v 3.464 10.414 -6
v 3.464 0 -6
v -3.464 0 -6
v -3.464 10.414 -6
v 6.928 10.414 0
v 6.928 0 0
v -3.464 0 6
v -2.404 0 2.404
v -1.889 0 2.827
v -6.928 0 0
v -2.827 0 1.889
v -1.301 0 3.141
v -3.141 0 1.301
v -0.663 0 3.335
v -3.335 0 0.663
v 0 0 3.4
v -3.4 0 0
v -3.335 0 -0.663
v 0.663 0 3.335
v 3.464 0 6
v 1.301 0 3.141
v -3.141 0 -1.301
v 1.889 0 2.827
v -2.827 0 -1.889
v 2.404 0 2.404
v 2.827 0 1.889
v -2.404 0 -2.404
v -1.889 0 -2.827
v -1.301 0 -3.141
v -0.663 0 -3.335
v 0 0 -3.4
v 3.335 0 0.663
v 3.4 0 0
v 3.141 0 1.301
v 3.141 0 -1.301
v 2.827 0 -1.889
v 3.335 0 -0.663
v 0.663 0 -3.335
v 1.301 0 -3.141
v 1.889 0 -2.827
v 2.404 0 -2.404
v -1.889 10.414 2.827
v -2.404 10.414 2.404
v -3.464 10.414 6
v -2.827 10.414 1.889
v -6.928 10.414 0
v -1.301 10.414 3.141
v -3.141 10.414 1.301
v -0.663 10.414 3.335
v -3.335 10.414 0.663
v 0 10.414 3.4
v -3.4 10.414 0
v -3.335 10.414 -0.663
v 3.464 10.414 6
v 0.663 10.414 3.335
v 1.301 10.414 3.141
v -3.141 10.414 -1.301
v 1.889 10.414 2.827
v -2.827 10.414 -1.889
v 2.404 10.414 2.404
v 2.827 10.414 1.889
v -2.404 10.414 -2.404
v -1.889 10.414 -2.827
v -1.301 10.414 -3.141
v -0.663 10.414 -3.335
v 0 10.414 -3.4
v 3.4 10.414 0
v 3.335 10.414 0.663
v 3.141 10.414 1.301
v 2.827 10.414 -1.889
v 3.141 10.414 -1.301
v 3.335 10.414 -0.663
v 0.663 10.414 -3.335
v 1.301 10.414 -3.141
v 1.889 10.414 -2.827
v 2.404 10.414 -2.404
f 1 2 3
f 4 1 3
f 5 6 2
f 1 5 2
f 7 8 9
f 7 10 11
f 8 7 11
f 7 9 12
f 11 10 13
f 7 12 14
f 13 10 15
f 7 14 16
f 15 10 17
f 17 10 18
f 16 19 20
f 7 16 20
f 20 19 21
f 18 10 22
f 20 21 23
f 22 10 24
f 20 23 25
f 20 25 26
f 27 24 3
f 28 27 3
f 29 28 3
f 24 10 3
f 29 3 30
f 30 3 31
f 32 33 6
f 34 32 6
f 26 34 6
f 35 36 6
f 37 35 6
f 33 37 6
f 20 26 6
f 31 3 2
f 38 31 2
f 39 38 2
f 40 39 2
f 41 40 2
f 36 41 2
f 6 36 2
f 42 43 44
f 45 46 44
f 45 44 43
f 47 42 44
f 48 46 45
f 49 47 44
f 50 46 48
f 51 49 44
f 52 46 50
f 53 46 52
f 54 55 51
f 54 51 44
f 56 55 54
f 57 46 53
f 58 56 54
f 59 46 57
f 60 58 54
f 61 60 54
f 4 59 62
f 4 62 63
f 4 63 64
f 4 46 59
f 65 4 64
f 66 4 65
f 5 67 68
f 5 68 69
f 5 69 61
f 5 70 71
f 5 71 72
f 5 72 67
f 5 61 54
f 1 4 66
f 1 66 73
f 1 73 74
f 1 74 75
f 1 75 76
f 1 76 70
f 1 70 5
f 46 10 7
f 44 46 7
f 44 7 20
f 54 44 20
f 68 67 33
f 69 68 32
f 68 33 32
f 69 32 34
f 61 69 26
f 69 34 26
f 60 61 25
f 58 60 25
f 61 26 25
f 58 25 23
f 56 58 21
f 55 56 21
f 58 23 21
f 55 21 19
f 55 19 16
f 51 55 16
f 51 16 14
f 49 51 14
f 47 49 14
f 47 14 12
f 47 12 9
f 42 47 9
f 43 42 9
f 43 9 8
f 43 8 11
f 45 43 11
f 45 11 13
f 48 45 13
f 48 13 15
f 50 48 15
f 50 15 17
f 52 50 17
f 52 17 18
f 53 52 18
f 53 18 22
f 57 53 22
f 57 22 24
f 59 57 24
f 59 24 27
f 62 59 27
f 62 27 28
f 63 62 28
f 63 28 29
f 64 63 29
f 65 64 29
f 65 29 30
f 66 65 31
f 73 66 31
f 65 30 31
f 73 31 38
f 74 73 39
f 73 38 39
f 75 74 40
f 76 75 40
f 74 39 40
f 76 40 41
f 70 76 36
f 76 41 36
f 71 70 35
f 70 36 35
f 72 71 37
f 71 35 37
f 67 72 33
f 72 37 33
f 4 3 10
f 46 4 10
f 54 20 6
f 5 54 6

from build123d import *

# Parameters (mm, degrees)
EXTRUDE1_DEPTH         = 10.414
M8X1_25_TAPPED_HOLE1_D = 6.8


with BuildPart() as part:
    # Sketch1 → Extrude1 (new body)
    with BuildSketch(Plane(origin=(0, 0, 0), x_dir=(1, 0, 0), z_dir=(0, 1, 0))):
        Polygon((3.464101615, 6), (-3.464101615, 6), (-6.92820323, 0), (-3.464101615, -6), (3.464101615, -6), (6.92820323, 0), align=None)
    extrude(amount=EXTRUDE1_DEPTH)

    # M8x1.25 Tapped Hole1 (through all)
    with Locations(Plane(origin=(0, 10.414, 0), x_dir=(-1, 0, 0), z_dir=(0, 1, 0))):
        with Locations((0, 0)):
            Hole(M8X1_25_TAPPED_HOLE1_D / 2)


solid = part.part
